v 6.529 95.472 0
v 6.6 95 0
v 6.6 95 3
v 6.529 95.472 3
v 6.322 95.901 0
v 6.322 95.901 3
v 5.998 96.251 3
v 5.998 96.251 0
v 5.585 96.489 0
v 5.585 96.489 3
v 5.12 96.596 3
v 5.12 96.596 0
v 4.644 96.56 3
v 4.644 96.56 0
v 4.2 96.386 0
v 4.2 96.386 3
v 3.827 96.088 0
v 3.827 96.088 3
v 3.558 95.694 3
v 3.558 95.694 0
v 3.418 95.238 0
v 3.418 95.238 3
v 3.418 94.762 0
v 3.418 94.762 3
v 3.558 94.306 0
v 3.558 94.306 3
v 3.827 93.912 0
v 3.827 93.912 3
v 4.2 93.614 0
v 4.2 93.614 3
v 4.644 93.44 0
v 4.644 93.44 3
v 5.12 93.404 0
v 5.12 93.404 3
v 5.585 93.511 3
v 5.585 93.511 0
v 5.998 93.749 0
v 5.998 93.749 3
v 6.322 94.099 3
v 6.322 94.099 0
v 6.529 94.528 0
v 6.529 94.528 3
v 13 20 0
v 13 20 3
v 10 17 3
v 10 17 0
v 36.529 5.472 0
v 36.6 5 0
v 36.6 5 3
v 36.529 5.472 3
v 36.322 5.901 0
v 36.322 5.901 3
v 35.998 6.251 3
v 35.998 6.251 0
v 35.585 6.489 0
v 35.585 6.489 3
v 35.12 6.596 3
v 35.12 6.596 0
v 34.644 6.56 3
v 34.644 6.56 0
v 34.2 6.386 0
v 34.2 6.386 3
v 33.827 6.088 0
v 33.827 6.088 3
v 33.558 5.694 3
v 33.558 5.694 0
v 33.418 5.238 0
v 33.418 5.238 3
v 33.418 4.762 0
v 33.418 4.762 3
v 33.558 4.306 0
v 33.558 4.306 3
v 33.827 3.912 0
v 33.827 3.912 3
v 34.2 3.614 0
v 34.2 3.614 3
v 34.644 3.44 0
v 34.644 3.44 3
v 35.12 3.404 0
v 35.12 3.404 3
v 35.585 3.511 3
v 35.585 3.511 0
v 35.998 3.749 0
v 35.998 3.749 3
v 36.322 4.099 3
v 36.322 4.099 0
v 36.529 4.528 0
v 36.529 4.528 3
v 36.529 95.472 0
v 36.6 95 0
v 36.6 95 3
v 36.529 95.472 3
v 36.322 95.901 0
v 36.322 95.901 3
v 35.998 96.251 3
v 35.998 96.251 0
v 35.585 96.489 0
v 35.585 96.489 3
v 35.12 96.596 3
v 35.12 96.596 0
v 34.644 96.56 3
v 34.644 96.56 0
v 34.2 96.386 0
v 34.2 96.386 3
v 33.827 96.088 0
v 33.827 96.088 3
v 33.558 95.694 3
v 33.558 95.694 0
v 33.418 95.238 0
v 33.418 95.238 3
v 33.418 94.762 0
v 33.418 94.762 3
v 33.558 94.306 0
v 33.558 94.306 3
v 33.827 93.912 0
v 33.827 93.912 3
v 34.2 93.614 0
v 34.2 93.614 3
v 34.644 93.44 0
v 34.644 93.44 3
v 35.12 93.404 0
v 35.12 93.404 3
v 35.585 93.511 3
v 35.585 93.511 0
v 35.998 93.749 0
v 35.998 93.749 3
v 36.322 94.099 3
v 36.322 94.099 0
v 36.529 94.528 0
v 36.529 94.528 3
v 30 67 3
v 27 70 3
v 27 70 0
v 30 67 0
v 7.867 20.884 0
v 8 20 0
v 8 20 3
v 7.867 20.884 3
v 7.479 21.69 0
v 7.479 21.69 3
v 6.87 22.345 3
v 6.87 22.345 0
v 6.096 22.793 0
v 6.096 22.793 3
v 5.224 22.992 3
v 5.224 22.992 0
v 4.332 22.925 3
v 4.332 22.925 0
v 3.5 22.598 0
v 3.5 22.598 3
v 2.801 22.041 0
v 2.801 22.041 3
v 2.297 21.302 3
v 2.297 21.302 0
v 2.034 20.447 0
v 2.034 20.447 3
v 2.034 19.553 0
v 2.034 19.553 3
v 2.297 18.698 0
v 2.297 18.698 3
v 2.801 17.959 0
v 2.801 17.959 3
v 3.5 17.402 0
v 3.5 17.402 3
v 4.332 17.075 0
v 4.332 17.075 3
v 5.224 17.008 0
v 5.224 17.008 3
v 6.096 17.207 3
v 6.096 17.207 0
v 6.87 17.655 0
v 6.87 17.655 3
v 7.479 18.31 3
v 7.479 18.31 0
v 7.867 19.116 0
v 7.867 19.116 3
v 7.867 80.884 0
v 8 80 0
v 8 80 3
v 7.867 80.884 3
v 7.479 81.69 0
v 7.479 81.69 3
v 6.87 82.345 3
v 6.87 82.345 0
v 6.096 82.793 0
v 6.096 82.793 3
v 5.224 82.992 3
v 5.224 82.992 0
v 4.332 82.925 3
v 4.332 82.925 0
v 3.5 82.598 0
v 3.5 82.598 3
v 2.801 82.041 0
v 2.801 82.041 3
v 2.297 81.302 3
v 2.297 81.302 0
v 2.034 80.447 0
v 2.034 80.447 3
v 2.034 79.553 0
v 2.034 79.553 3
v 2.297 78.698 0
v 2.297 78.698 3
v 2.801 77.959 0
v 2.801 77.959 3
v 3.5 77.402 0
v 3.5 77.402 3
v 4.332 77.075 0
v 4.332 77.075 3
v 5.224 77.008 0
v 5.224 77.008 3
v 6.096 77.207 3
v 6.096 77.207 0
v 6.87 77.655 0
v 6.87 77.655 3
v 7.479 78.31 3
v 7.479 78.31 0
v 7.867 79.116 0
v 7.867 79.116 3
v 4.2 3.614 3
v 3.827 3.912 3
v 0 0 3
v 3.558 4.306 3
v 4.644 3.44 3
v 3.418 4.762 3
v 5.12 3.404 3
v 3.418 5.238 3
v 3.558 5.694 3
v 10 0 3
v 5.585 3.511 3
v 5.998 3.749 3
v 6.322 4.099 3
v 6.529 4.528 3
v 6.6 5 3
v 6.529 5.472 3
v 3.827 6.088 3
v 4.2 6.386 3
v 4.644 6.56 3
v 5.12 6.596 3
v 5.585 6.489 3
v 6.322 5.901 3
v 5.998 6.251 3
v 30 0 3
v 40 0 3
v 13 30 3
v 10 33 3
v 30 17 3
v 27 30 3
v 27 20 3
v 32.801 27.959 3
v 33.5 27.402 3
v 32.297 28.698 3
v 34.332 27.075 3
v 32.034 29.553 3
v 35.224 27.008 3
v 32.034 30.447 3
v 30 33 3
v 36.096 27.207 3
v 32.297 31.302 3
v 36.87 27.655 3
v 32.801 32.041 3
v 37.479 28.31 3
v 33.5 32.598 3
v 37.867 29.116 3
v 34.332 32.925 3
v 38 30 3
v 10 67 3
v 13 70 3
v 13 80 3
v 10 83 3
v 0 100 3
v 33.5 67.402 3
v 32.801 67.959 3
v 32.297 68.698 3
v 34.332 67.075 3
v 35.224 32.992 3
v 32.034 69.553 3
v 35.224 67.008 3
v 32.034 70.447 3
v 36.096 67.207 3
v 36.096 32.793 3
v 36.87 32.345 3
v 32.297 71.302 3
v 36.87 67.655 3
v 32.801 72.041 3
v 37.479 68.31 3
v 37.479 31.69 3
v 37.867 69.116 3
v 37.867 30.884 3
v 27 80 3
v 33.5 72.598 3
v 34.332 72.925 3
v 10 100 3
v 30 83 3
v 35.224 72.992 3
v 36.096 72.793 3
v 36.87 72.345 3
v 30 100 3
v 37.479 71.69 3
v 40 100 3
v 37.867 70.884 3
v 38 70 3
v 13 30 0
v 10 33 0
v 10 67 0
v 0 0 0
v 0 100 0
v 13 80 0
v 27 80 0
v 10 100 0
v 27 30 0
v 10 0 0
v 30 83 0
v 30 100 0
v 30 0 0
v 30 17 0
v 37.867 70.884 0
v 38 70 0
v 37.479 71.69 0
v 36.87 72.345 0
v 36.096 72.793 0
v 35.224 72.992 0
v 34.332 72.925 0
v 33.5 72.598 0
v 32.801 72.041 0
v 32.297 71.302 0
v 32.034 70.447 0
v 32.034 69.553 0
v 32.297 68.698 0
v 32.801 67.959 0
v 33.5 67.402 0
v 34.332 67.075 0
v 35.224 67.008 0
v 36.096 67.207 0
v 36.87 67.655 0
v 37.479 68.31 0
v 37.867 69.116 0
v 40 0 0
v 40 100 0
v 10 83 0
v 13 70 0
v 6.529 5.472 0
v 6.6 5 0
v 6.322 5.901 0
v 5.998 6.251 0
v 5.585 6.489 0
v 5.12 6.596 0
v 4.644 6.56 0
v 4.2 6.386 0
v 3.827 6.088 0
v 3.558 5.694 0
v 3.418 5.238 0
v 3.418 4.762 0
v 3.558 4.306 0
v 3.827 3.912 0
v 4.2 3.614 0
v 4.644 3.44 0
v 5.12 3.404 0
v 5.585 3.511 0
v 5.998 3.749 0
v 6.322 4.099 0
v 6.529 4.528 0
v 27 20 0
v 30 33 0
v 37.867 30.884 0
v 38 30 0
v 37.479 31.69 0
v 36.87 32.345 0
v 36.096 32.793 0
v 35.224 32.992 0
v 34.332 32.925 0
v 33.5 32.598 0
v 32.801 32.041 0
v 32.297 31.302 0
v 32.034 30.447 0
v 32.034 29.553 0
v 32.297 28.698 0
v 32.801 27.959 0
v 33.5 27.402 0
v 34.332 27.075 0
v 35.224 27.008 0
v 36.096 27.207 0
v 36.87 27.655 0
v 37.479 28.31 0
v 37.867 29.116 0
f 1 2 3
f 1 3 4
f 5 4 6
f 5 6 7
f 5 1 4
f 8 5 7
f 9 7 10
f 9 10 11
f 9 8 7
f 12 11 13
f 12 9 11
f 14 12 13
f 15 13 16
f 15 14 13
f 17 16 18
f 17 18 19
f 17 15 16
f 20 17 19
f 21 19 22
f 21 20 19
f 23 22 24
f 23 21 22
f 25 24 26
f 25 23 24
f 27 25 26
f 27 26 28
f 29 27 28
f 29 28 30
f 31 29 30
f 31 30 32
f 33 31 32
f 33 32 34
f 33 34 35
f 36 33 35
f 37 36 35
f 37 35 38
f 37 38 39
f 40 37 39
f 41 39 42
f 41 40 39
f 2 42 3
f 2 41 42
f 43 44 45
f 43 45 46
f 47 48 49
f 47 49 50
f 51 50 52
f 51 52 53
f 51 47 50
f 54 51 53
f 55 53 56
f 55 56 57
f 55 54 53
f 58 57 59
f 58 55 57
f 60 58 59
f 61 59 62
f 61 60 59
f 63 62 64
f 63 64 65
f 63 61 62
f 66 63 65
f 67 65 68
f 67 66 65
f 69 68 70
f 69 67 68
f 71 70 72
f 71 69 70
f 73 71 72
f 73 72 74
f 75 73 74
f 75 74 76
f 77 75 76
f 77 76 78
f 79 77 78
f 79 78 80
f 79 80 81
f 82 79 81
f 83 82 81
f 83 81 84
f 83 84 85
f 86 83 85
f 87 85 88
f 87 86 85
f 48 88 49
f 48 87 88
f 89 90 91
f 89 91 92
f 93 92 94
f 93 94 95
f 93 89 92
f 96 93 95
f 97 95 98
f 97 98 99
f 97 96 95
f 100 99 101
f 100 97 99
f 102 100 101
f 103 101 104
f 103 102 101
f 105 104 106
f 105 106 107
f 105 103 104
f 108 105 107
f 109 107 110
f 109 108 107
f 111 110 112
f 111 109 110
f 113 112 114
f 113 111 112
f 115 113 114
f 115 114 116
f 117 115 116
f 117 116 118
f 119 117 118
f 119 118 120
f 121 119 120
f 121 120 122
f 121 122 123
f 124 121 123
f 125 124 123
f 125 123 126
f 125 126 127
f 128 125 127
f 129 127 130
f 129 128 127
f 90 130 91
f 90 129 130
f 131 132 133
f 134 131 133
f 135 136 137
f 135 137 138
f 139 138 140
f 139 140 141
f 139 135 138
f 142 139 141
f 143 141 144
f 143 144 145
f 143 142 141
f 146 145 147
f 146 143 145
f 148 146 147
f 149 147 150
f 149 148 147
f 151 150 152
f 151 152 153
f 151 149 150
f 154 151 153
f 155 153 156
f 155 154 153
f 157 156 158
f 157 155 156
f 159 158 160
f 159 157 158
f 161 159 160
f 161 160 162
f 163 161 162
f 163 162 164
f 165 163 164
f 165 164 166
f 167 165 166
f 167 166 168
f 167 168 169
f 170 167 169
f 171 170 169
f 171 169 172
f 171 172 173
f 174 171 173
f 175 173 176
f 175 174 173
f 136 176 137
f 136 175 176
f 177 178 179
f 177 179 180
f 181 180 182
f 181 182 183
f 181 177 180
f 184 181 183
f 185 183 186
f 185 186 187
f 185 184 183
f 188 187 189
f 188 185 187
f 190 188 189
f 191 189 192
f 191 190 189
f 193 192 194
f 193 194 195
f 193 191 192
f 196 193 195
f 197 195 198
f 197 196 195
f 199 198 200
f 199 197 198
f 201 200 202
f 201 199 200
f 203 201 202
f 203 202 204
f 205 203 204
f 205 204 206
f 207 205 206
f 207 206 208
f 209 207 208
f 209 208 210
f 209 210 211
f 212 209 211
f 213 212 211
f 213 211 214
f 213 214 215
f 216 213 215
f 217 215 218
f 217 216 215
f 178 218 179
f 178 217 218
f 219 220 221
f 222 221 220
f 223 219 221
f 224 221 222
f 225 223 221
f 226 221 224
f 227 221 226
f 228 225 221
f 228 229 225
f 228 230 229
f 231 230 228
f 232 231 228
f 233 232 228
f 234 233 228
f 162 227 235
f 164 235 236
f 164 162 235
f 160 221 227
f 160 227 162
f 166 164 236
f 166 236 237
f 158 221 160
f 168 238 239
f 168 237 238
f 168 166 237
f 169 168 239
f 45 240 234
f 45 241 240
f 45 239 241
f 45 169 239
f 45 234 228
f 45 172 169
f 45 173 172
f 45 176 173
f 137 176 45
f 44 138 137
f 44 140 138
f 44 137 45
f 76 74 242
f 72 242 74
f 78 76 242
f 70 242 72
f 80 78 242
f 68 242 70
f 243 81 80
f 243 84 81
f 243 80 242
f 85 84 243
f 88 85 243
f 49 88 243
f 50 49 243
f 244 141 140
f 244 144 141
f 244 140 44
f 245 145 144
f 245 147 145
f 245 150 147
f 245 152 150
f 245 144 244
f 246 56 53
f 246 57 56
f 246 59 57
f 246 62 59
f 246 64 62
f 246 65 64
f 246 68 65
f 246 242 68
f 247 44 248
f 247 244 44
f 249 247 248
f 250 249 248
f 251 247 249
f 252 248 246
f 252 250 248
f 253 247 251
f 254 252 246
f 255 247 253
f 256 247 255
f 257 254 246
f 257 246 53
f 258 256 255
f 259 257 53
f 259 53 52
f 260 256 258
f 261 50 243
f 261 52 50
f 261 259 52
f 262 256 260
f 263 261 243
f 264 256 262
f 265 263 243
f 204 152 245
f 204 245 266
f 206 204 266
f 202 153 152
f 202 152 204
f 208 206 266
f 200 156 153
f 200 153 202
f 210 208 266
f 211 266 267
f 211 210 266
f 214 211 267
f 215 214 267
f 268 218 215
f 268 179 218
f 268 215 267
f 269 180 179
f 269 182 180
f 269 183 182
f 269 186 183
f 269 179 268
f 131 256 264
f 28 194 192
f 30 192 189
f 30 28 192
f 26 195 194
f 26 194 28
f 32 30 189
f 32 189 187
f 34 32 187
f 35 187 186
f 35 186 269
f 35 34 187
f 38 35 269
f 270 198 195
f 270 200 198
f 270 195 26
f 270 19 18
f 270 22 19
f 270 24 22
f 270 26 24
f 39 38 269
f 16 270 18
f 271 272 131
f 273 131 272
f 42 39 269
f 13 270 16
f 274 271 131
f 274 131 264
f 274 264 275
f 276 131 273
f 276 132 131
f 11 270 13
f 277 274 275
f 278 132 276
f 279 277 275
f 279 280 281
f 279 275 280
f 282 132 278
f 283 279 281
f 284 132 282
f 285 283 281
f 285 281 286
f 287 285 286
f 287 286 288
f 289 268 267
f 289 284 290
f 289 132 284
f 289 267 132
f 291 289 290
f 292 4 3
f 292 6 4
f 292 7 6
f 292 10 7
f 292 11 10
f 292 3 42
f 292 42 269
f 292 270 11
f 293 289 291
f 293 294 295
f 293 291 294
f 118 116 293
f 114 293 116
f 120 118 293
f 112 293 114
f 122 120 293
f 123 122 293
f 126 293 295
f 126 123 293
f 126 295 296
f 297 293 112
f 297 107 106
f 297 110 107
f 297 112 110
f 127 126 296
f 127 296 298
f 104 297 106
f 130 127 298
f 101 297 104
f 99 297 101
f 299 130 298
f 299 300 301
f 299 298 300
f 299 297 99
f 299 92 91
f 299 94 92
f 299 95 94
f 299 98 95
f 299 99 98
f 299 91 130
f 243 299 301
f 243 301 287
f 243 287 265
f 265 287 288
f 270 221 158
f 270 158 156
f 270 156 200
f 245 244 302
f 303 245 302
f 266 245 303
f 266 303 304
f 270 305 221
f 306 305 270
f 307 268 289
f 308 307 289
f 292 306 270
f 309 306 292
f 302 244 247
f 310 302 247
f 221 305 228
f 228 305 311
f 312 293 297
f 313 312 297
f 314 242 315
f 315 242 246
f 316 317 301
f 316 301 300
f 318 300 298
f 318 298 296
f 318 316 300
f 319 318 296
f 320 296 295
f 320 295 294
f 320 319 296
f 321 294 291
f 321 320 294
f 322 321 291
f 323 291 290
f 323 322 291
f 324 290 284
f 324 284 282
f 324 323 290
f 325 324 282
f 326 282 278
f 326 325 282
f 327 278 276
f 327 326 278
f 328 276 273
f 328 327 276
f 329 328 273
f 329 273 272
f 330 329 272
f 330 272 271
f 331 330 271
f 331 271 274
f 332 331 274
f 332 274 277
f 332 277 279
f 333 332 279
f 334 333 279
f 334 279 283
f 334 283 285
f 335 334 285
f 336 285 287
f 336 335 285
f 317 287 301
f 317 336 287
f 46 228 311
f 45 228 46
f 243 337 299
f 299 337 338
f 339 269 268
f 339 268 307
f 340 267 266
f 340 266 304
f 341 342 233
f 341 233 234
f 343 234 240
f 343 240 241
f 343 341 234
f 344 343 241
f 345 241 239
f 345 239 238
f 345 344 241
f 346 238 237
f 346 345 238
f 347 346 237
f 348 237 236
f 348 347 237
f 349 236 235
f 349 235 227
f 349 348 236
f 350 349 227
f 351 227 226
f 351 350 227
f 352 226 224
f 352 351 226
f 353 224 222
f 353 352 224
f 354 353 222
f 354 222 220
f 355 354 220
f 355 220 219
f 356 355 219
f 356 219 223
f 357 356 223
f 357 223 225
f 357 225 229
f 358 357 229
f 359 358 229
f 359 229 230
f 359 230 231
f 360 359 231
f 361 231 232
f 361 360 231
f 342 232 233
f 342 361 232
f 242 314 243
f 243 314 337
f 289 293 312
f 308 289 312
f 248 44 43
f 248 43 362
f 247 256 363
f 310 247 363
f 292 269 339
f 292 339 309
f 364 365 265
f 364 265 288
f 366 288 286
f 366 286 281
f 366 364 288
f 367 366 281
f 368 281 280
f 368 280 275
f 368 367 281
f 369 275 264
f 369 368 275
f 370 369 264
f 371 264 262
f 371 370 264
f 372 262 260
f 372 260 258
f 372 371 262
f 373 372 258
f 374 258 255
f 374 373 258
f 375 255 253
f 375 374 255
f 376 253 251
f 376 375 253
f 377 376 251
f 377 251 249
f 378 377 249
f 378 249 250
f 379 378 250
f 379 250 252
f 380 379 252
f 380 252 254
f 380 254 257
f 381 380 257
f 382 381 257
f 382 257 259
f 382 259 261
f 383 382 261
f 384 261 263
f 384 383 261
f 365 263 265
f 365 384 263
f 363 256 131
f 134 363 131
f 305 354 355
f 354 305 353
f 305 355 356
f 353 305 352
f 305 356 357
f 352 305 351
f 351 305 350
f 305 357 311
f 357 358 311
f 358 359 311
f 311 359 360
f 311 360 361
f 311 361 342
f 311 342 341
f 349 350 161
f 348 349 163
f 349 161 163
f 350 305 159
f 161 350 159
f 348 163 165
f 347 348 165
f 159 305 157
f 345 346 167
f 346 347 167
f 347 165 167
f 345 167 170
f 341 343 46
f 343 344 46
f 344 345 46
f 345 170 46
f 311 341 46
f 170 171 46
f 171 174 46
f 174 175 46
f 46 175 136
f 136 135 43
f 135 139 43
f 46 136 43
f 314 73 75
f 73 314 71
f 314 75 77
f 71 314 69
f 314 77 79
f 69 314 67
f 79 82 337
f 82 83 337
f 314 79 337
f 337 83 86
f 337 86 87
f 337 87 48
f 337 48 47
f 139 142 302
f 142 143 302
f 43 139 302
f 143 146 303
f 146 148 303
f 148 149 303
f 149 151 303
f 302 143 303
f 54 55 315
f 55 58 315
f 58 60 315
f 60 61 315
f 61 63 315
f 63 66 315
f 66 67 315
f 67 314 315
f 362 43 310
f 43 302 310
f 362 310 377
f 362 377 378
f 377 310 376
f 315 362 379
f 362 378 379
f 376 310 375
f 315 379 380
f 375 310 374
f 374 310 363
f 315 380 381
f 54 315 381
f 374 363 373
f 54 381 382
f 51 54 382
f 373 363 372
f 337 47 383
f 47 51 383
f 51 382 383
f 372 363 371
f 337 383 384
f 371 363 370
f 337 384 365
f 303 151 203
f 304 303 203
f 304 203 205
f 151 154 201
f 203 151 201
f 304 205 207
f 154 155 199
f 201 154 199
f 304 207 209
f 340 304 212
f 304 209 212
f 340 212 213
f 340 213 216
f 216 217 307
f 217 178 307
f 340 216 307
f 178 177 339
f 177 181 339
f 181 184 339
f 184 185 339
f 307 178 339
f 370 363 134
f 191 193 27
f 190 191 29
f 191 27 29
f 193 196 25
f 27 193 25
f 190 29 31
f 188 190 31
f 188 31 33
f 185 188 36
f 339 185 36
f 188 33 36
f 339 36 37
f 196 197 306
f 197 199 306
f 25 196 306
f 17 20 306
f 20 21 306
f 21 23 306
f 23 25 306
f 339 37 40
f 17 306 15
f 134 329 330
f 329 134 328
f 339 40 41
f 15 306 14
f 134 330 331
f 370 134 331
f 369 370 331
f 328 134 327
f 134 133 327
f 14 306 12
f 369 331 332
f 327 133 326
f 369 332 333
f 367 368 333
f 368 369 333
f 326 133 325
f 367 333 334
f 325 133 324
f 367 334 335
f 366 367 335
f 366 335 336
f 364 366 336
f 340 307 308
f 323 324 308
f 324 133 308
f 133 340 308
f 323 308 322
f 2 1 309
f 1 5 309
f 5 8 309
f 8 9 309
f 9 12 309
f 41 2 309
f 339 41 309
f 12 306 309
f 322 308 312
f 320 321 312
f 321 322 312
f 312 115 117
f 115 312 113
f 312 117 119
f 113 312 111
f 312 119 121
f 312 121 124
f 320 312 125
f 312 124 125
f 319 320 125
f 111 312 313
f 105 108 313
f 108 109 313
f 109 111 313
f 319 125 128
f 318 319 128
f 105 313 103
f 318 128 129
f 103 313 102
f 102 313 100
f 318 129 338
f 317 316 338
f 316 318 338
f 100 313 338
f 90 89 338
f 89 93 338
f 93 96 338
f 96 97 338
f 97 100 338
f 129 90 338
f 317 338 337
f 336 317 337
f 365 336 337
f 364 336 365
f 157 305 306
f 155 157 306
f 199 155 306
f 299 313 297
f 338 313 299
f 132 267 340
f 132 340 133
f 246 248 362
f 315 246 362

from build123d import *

# Parameters (mm, degrees)
SKETCH_1_W          = 40
SKETCH_1_H          = 100
SKETCH_1_R          = 1.6
SKETCH_1_R_2        = 3
EXTRUDE_1_DEPTH     = 3
SKETCH_2_W          = 20
SKETCH_2_H          = 20
CUT_EXTRUDE_1_DEPTH = 108.745069493
SKETCH_3_W          = 20
SKETCH_3_H          = 40
CUT_EXTRUDE_2_DEPTH = 10
CHAMFER_1_SIZE      = 3


with BuildPart() as part:
    # ｽｹｯﾁ1 → ﾎﾞｽ - 押し出し1 (new body)
    with BuildSketch(Plane.XY):
        with Locations((20, 50)):
            Rectangle(SKETCH_1_W, SKETCH_1_H)
        with Locations((5, 95)):
            Circle(SKETCH_1_R, mode=Mode.SUBTRACT)
        with Locations((35, 95)):
            Circle(SKETCH_1_R, mode=Mode.SUBTRACT)
        with Locations((5, 80)):
            Circle(SKETCH_1_R_2, mode=Mode.SUBTRACT)
        with Locations((35, 70)):
            Circle(SKETCH_1_R_2, mode=Mode.SUBTRACT)
        with Locations((5, 20)):
            Circle(SKETCH_1_R_2, mode=Mode.SUBTRACT)
        with Locations((35, 30)):
            Circle(SKETCH_1_R_2, mode=Mode.SUBTRACT)
        with Locations((5, 5)):
            Circle(SKETCH_1_R, mode=Mode.SUBTRACT)
        with Locations((35, 5)):
            Circle(SKETCH_1_R, mode=Mode.SUBTRACT)
    extrude(amount=EXTRUDE_1_DEPTH)

    # ｽｹｯﾁ2 → ｶｯﾄ - 押し出し1 (cut, through all)
    with BuildSketch(Plane.XY.offset(3)):
        with Locations((20, 90)):
            Rectangle(SKETCH_2_W, SKETCH_2_H)
        with Locations((20, 10)):
            Rectangle(SKETCH_2_W, SKETCH_2_H)
    extrude(amount=-CUT_EXTRUDE_1_DEPTH, mode=Mode.SUBTRACT)

    # ｽｹｯﾁ3 → ｶｯﾄ - 押し出し2 (cut)
    with BuildSketch(Plane.XY.offset(3)):
        with Locations((20, 50)):
            Rectangle(SKETCH_3_W, SKETCH_3_H)
    extrude(amount=-CUT_EXTRUDE_2_DEPTH, mode=Mode.SUBTRACT)

    # 面取り1
    chamfer_1_edges = [part.edges().sort_by_distance(p)[0] for p in [
        (10, 80, 1.5),
        (30, 80, 1.5),
        (10, 20, 1.5),
        (30, 20, 1.5),
        (30, 70, 1.5),
        (30, 30, 1.5),
        (10, 30, 1.5),
        (10, 70, 1.5),
    ]]
    chamfer(chamfer_1_edges, length=CHAMFER_1_SIZE)


solid = part.part
